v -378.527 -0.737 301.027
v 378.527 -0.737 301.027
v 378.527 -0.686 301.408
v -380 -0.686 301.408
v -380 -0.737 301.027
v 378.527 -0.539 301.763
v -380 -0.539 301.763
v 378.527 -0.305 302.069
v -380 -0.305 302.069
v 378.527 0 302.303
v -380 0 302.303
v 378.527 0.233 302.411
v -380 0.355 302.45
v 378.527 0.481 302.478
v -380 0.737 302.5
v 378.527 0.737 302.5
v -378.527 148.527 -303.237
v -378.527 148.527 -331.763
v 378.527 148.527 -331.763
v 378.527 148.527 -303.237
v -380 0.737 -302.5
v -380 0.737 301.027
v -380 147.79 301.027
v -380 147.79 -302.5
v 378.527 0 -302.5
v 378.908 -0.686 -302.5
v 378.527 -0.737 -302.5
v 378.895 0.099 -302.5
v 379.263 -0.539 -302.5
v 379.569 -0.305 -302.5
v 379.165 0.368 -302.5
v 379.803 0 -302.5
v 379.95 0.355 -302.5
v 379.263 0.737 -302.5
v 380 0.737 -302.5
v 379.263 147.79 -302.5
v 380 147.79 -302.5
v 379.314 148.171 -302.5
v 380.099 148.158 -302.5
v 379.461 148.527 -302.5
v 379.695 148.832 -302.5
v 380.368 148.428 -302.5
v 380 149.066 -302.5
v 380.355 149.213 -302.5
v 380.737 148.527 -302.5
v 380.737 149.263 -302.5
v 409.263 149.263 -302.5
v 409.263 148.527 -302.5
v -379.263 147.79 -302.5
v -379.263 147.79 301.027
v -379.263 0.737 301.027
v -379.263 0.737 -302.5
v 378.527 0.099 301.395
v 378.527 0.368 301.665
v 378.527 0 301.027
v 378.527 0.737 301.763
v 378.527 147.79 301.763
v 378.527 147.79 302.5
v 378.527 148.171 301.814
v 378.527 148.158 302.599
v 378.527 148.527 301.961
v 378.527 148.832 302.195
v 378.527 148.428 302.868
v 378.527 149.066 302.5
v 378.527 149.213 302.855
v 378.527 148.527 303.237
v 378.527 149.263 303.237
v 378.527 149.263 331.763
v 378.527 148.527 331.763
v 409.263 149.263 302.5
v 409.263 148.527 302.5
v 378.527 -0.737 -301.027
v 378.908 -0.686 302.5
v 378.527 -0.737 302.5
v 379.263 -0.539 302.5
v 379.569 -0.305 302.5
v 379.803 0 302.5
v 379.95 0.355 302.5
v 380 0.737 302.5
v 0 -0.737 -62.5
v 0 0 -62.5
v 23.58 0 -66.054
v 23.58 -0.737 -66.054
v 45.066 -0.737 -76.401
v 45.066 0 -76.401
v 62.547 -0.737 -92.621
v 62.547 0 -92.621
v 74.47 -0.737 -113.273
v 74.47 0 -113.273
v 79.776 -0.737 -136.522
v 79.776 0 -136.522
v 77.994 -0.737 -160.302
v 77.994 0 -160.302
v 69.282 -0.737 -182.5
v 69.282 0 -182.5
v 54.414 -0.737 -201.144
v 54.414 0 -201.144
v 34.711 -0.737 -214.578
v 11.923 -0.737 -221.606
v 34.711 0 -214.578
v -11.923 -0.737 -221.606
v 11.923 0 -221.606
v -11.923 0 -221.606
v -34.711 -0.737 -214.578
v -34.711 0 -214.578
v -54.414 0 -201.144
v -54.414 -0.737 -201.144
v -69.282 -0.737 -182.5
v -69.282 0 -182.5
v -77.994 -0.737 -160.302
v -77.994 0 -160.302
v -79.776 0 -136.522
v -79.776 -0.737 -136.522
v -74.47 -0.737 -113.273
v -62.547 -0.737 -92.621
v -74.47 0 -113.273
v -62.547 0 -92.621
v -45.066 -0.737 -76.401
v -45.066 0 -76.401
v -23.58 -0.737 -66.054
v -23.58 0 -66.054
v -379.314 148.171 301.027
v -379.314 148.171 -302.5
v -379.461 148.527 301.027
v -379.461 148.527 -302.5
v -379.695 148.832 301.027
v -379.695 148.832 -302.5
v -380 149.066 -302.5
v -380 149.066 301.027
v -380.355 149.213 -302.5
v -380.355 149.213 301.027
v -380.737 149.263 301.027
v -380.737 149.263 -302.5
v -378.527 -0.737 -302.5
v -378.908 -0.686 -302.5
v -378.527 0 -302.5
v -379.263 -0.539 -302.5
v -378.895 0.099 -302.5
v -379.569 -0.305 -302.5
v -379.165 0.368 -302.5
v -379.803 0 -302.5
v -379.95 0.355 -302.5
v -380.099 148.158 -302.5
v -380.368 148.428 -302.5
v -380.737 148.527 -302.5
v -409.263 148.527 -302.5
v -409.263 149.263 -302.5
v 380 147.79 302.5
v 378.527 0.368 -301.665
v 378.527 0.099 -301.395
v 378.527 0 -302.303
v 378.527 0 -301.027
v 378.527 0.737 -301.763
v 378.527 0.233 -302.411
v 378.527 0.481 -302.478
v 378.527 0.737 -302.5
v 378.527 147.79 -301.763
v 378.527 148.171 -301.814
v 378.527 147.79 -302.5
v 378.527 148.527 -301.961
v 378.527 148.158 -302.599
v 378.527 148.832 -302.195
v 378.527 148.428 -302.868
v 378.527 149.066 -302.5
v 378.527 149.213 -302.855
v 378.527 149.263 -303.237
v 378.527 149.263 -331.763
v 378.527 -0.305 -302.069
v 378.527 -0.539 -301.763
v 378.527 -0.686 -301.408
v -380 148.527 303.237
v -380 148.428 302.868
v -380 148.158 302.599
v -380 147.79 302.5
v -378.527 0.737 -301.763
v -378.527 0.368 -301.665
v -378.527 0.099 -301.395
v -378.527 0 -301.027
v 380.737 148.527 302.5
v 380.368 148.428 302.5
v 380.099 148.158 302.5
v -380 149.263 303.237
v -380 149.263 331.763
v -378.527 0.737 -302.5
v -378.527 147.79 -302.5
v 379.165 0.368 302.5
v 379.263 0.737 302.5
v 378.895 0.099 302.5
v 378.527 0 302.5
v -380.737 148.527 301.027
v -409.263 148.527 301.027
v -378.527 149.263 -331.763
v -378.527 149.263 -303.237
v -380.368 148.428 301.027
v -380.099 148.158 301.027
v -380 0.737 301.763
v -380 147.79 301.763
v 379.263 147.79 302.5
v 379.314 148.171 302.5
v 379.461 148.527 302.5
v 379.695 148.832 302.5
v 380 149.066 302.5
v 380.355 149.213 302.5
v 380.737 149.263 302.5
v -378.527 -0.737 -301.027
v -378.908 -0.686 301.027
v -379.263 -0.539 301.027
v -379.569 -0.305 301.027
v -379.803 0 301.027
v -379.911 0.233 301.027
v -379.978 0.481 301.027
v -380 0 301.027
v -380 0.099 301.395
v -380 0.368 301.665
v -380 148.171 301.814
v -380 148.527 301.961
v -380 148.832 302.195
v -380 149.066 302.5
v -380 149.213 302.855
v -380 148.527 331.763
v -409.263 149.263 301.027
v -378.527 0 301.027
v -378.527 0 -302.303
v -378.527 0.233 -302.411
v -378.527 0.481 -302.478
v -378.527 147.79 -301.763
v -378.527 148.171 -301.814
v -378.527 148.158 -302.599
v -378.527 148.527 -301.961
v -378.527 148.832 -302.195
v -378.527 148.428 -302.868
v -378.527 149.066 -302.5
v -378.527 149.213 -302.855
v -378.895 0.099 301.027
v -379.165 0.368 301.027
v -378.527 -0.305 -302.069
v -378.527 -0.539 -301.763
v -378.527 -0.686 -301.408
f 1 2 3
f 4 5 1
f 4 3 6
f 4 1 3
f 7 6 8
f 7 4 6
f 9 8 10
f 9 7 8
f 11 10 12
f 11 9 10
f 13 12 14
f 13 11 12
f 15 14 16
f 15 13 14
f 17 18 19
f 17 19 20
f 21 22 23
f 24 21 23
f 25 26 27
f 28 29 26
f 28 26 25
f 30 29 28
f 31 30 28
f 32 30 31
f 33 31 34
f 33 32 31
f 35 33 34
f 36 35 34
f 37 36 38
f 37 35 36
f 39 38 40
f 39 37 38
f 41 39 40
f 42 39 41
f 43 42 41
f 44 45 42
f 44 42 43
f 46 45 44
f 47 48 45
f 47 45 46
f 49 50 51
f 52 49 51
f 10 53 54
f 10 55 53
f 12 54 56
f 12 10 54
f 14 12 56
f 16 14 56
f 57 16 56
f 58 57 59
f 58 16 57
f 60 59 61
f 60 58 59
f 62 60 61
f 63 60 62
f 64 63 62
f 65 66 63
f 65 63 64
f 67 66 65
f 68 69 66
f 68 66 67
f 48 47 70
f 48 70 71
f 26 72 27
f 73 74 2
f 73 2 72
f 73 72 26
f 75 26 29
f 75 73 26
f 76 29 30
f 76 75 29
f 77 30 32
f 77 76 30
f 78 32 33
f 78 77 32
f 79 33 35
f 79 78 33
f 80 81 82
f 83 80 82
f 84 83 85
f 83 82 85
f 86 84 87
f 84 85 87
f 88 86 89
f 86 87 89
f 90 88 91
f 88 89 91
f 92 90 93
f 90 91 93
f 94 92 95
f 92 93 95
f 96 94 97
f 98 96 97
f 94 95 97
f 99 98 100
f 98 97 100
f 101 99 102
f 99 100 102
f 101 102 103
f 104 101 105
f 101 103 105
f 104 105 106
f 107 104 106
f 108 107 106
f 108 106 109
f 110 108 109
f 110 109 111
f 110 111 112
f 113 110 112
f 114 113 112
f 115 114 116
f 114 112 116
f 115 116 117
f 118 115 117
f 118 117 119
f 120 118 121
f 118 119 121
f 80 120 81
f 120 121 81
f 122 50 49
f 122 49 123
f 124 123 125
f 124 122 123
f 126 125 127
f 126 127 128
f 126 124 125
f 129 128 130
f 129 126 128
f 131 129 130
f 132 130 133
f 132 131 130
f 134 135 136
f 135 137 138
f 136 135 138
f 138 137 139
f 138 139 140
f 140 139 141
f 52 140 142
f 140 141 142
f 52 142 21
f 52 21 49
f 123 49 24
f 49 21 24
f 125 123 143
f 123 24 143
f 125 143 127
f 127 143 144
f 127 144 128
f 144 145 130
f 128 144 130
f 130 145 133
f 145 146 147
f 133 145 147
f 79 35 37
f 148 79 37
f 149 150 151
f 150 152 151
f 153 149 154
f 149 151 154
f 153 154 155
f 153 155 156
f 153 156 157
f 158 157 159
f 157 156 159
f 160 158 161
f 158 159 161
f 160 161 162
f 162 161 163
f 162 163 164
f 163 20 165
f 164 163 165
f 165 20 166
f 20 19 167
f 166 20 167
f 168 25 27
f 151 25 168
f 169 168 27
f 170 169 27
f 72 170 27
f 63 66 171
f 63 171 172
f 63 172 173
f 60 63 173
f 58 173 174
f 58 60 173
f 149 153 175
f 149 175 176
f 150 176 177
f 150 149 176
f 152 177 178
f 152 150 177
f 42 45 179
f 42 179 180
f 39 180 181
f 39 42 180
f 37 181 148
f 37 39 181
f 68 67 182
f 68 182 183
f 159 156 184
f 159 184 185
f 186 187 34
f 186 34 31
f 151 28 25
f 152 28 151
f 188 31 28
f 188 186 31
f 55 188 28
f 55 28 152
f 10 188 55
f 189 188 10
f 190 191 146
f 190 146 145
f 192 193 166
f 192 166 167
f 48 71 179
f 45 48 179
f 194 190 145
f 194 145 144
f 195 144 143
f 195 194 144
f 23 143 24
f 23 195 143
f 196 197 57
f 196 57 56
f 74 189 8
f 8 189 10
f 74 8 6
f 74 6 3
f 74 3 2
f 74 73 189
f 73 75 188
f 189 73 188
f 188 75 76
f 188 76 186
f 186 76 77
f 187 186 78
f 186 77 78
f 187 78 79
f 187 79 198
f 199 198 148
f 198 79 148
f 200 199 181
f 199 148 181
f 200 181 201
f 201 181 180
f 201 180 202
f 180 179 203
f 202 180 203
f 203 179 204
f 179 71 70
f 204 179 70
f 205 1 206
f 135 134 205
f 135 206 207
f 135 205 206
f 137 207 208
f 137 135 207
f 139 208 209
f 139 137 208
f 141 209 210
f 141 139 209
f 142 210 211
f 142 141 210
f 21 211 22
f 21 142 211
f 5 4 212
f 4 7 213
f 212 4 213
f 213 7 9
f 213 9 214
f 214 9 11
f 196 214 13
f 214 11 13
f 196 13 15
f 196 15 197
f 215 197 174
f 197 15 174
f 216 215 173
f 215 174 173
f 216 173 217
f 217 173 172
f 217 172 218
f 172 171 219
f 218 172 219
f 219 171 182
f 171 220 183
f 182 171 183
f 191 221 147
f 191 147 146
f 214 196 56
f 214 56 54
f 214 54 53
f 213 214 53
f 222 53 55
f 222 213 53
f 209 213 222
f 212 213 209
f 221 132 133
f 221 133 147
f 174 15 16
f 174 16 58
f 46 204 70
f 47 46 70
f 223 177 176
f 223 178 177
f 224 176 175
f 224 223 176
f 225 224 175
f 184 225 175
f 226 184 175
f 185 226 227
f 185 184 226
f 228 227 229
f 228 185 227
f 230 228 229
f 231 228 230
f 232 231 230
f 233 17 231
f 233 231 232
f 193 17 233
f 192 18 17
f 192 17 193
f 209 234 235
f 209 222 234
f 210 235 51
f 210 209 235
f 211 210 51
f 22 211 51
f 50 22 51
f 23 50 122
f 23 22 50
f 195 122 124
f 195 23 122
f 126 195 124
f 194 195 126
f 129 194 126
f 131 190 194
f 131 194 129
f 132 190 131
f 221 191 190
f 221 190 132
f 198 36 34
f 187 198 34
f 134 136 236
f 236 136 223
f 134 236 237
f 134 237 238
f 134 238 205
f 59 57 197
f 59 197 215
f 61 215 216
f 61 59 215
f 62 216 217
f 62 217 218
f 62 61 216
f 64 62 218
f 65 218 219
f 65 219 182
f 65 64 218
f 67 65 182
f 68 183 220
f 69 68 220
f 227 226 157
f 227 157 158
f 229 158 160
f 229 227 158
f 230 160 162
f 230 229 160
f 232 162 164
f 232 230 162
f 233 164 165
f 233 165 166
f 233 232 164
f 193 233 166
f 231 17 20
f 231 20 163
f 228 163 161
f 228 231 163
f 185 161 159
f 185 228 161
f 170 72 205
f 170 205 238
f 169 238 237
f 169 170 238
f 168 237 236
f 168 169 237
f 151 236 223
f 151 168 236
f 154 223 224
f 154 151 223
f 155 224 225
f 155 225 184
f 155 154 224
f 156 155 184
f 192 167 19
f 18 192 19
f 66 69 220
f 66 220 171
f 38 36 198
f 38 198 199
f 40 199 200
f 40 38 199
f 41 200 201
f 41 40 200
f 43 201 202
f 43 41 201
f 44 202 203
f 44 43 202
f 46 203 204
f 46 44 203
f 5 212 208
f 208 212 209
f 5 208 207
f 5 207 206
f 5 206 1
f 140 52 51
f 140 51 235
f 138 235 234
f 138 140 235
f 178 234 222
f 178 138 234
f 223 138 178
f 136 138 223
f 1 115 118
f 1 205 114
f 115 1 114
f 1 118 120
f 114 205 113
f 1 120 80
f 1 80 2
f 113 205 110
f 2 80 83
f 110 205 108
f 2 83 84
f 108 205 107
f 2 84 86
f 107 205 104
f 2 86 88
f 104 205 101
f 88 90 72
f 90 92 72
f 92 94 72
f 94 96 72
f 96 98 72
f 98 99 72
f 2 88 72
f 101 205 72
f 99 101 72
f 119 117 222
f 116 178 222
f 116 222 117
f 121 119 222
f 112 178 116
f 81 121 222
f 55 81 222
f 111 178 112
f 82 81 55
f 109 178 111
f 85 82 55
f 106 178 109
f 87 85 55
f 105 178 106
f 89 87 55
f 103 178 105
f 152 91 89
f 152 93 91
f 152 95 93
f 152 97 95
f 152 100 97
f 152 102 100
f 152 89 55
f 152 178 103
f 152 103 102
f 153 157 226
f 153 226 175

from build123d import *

# Parameters (mm, degrees)
SKETCH1_W                    = 760
SKETCH1_H                    = 605
SKETCH1_R                    = 80
BASE_FLANGE1_DEPTH           = 0.7366
EDGE_FLANGE1_STRIP_W         = 4.4196
EDGE_FLANGE1_STRIP_H         = 0.7366
EDGE_FLANGE1_STRIP_CUT_DEPTH = 605
EDGE_FLANGE1_DEPTH           = 605
EDGE_FLANGE2_STRIP_W         = 4.4196
EDGE_FLANGE2_STRIP_H         = 0.7366
EDGE_FLANGE2_STRIP_CUT_DEPTH = 758.5268
EDGE_FLANGE2_DEPTH           = 758.5268
EDGE_FLANGE3_STRIP_W         = 4.4196
EDGE_FLANGE3_STRIP_H         = 0.7366
EDGE_FLANGE3_STRIP_CUT_DEPTH = 603.5268
EDGE_FLANGE3_DEPTH           = 603.5268
EDGE_FLANGE4_STRIP_W         = 4.4196
EDGE_FLANGE4_STRIP_H         = 0.7366
EDGE_FLANGE4_STRIP_CUT_DEPTH = 757.0536
EDGE_FLANGE4_DEPTH           = 757.0536
EDGE_FLANGE5_STRIP_W         = 4.4196
EDGE_FLANGE5_STRIP_H         = 0.7366
EDGE_FLANGE5_STRIP_CUT_DEPTH = 758.5268
EDGE_FLANGE5_DEPTH           = 758.5268
EDGE_FLANGE6_STRIP_W         = 4.4196
EDGE_FLANGE6_STRIP_H         = 0.7366
EDGE_FLANGE6_STRIP_CUT_DEPTH = 603.5268
EDGE_FLANGE6_DEPTH           = 603.5268
EDGE_FLANGE7_STRIP_W         = 4.4196
EDGE_FLANGE7_STRIP_H         = 0.7366
EDGE_FLANGE7_STRIP_CUT_DEPTH = 757.0536
EDGE_FLANGE7_DEPTH           = 757.0536
EDGE_FLANGE8_STRIP_W         = 4.4196
EDGE_FLANGE8_STRIP_H         = 0.7366
EDGE_FLANGE8_STRIP_CUT_DEPTH = 605
EDGE_FLANGE8_DEPTH           = 605


# Sheet-metal steps are written as plain solids
with BuildPart() as part:
    # Sketch1 → Base-Flange1 (new body)
    with BuildSketch(Plane(origin=(0, 0, 0), x_dir=(1, 0, 0), z_dir=(0, 1, 0))):
        Rectangle(SKETCH1_W, SKETCH1_H)
        with Locations(Location((0, 142.5, 0), (0, 0, 270))):
            Circle(SKETCH1_R, mode=Mode.SUBTRACT)
    extrude(amount=-BASE_FLANGE1_DEPTH)

    # Edge-Flange1 strip (across the edge) → Edge-Flange1 strip cut (cut)
    with BuildSketch(Plane(origin=(380, 0, 302.5), x_dir=(-1, 0, 0), z_dir=(0, 0, -1))):
        with Locations((-0.7366, -0.3683)):
            Rectangle(EDGE_FLANGE1_STRIP_W, EDGE_FLANGE1_STRIP_H)
    extrude(amount=EDGE_FLANGE1_STRIP_CUT_DEPTH, mode=Mode.SUBTRACT)

    # Edge-Flange1 section (across the edge) → Edge-Flange1 (add)
    with BuildSketch(Plane(origin=(380, 0, 302.5), x_dir=(-1, 0, 0), z_dir=(0, 0, -1))):
        with BuildLine():
            Line((0, 0.7366), (0, 149.2634))
            Line((0, 149.2634), (0.7366, 149.2634))
            Line((0.7366, 149.2634), (0.7366, 0.7366))
            ThreePointArc((0.7366, 0.7366), (0.952345145, 0.215745145), (1.4732, 0))
            Line((1.4732, 0), (1.4732, -0.7366))
            ThreePointArc((1.4732, -0.7366), (0.43149029, -0.30510971), (0, 0.7366))
        make_face()
    extrude(amount=EDGE_FLANGE1_DEPTH)

    # Edge-Flange2 strip (across the edge) → Edge-Flange2 strip cut (cut)
    with BuildSketch(Plane(origin=(-380, 0, 302.5), x_dir=(0, 0, -1), z_dir=(1, 0, 0))):
        with Locations((-0.7366, -0.3683)):
            Rectangle(EDGE_FLANGE2_STRIP_W, EDGE_FLANGE2_STRIP_H)
    extrude(amount=EDGE_FLANGE2_STRIP_CUT_DEPTH, mode=Mode.SUBTRACT)

    # Edge-Flange2 section (across the edge) → Edge-Flange2 (add)
    with BuildSketch(Plane(origin=(-380, 0, 302.5), x_dir=(0, 0, -1), z_dir=(1, 0, 0))):
        with BuildLine():
            Line((0, 0.7366), (0, 149.2634))
            Line((0, 149.2634), (0.7366, 149.2634))
            Line((0.7366, 149.2634), (0.7366, 0.7366))
            ThreePointArc((0.7366, 0.7366), (0.952345145, 0.215745145), (1.4732, 0))
            Line((1.4732, 0), (1.4732, -0.7366))
            ThreePointArc((1.4732, -0.7366), (0.43149029, -0.30510971), (0, 0.7366))
        make_face()
    extrude(amount=EDGE_FLANGE2_DEPTH)

    # Edge-Flange3 strip (across the edge) → Edge-Flange3 strip cut (cut)
    with BuildSketch(Plane(origin=(-380, 0, -302.5), x_dir=(1, 0, 0), z_dir=(0, 0, 1))):
        with Locations((-0.7366, -0.3683)):
            Rectangle(EDGE_FLANGE3_STRIP_W, EDGE_FLANGE3_STRIP_H)
    extrude(amount=EDGE_FLANGE3_STRIP_CUT_DEPTH, mode=Mode.SUBTRACT)

    # Edge-Flange3 section (across the edge) → Edge-Flange3 (add)
    with BuildSketch(Plane(origin=(-380, 0, -302.5), x_dir=(1, 0, 0), z_dir=(0, 0, 1))):
        with BuildLine():
            Line((0, 0.7366), (0, 149.2634))
            Line((0, 149.2634), (0.7366, 149.2634))
            Line((0.7366, 149.2634), (0.7366, 0.7366))
            ThreePointArc((0.7366, 0.7366), (0.952345145, 0.215745145), (1.4732, 0))
            Line((1.4732, 0), (1.4732, -0.7366))
            ThreePointArc((1.4732, -0.7366), (0.43149029, -0.30510971), (0, 0.7366))
        make_face()
    extrude(amount=EDGE_FLANGE3_DEPTH)

    # Edge-Flange4 strip (across the edge) → Edge-Flange4 strip cut (cut)
    with BuildSketch(Plane(origin=(378.5268, 0, -302.5), x_dir=(0, 0, 1), z_dir=(-1, 0, 0))):
        with Locations((-0.7366, -0.3683)):
            Rectangle(EDGE_FLANGE4_STRIP_W, EDGE_FLANGE4_STRIP_H)
    extrude(amount=EDGE_FLANGE4_STRIP_CUT_DEPTH, mode=Mode.SUBTRACT)

    # Edge-Flange4 section (across the edge) → Edge-Flange4 (add)
    with BuildSketch(Plane(origin=(378.5268, 0, -302.5), x_dir=(0, 0, 1), z_dir=(-1, 0, 0))):
        with BuildLine():
            Line((0, 0.7366), (0, 149.2634))
            Line((0, 149.2634), (0.7366, 149.2634))
            Line((0.7366, 149.2634), (0.7366, 0.7366))
            ThreePointArc((0.7366, 0.7366), (0.952345145, 0.215745145), (1.4732, 0))
            Line((1.4732, 0), (1.4732, -0.7366))
            ThreePointArc((1.4732, -0.7366), (0.43149029, -0.30510971), (0, 0.7366))
        make_face()
    extrude(amount=EDGE_FLANGE4_DEPTH)

    # Edge-Flange5 strip (across the edge) → Edge-Flange5 strip cut (cut)
    with BuildSketch(Plane(origin=(378.5268, 149.2634, 302.5), x_dir=(0, -1, 0), z_dir=(-1, 0, 0))):
        with Locations((-0.7366, -0.3683)):
            Rectangle(EDGE_FLANGE5_STRIP_W, EDGE_FLANGE5_STRIP_H)
    extrude(amount=EDGE_FLANGE5_STRIP_CUT_DEPTH, mode=Mode.SUBTRACT)

    # Edge-Flange5 section (across the edge) → Edge-Flange5 (add)
    with BuildSketch(Plane(origin=(378.5268, 149.2634, 302.5), x_dir=(0, -1, 0), z_dir=(-1, 0, 0))):
        with BuildLine():
            Line((0, 0.7366), (0, 29.2634))
            Line((0, 29.2634), (0.7366, 29.2634))
            Line((0.7366, 29.2634), (0.7366, 0.7366))
            ThreePointArc((0.7366, 0.7366), (0.952345145, 0.215745145), (1.4732, 0))
            Line((1.4732, 0), (1.4732, -0.7366))
            ThreePointArc((1.4732, -0.7366), (0.43149029, -0.30510971), (0, 0.7366))
        make_face()
    extrude(amount=EDGE_FLANGE5_DEPTH)

    # Edge-Flange6 strip (across the edge) → Edge-Flange6 strip cut (cut)
    with BuildSketch(Plane(origin=(-380, 149.2634, 301.0268), x_dir=(0, -1, 0), z_dir=(0, 0, -1))):
        with Locations((-0.7366, -0.3683)):
            Rectangle(EDGE_FLANGE6_STRIP_W, EDGE_FLANGE6_STRIP_H)
    extrude(amount=EDGE_FLANGE6_STRIP_CUT_DEPTH, mode=Mode.SUBTRACT)

    # Edge-Flange6 section (across the edge) → Edge-Flange6 (add)
    with BuildSketch(Plane(origin=(-380, 149.2634, 301.0268), x_dir=(0, -1, 0), z_dir=(0, 0, -1))):
        with BuildLine():
            Line((0, 0.7366), (0, 29.2634))
            Line((0, 29.2634), (0.7366, 29.2634))
            Line((0.7366, 29.2634), (0.7366, 0.7366))
            ThreePointArc((0.7366, 0.7366), (0.952345145, 0.215745145), (1.4732, 0))
            Line((1.4732, 0), (1.4732, -0.7366))
            ThreePointArc((1.4732, -0.7366), (0.43149029, -0.30510971), (0, 0.7366))
        make_face()
    extrude(amount=EDGE_FLANGE6_DEPTH)

    # Edge-Flange7 strip (across the edge) → Edge-Flange7 strip cut (cut)
    with BuildSketch(Plane(origin=(-378.5268, 149.2634, -302.5), x_dir=(0, -1, 0), z_dir=(1, 0, 0))):
        with Locations((-0.7366, -0.3683)):
            Rectangle(EDGE_FLANGE7_STRIP_W, EDGE_FLANGE7_STRIP_H)
    extrude(amount=EDGE_FLANGE7_STRIP_CUT_DEPTH, mode=Mode.SUBTRACT)

    # Edge-Flange7 section (across the edge) → Edge-Flange7 (add)
    with BuildSketch(Plane(origin=(-378.5268, 149.2634, -302.5), x_dir=(0, -1, 0), z_dir=(1, 0, 0))):
        with BuildLine():
            Line((0, 0.7366), (0, 29.2634))
            Line((0, 29.2634), (0.7366, 29.2634))
            Line((0.7366, 29.2634), (0.7366, 0.7366))
            ThreePointArc((0.7366, 0.7366), (0.952345145, 0.215745145), (1.4732, 0))
            Line((1.4732, 0), (1.4732, -0.7366))
            ThreePointArc((1.4732, -0.7366), (0.43149029, -0.30510971), (0, 0.7366))
        make_face()
    extrude(amount=EDGE_FLANGE7_DEPTH)

    # Edge-Flange8 strip (across the edge) → Edge-Flange8 strip cut (cut)
    with BuildSketch(Plane(origin=(380, 149.2634, -302.5), x_dir=(0, -1, 0), z_dir=(0, 0, 1))):
        with Locations((-0.7366, -0.3683)):
            Rectangle(EDGE_FLANGE8_STRIP_W, EDGE_FLANGE8_STRIP_H)
    extrude(amount=EDGE_FLANGE8_STRIP_CUT_DEPTH, mode=Mode.SUBTRACT)

    # Edge-Flange8 section (across the edge) → Edge-Flange8 (add)
    with BuildSketch(Plane(origin=(380, 149.2634, -302.5), x_dir=(0, -1, 0), z_dir=(0, 0, 1))):
        with BuildLine():
            Line((0, 0.7366), (0, 29.2634))
            Line((0, 29.2634), (0.7366, 29.2634))
            Line((0.7366, 29.2634), (0.7366, 0.7366))
            ThreePointArc((0.7366, 0.7366), (0.952345145, 0.215745145), (1.4732, 0))
            Line((1.4732, 0), (1.4732, -0.7366))
            ThreePointArc((1.4732, -0.7366), (0.43149029, -0.30510971), (0, 0.7366))
        make_face()
    extrude(amount=EDGE_FLANGE8_DEPTH)


solid = part.part
